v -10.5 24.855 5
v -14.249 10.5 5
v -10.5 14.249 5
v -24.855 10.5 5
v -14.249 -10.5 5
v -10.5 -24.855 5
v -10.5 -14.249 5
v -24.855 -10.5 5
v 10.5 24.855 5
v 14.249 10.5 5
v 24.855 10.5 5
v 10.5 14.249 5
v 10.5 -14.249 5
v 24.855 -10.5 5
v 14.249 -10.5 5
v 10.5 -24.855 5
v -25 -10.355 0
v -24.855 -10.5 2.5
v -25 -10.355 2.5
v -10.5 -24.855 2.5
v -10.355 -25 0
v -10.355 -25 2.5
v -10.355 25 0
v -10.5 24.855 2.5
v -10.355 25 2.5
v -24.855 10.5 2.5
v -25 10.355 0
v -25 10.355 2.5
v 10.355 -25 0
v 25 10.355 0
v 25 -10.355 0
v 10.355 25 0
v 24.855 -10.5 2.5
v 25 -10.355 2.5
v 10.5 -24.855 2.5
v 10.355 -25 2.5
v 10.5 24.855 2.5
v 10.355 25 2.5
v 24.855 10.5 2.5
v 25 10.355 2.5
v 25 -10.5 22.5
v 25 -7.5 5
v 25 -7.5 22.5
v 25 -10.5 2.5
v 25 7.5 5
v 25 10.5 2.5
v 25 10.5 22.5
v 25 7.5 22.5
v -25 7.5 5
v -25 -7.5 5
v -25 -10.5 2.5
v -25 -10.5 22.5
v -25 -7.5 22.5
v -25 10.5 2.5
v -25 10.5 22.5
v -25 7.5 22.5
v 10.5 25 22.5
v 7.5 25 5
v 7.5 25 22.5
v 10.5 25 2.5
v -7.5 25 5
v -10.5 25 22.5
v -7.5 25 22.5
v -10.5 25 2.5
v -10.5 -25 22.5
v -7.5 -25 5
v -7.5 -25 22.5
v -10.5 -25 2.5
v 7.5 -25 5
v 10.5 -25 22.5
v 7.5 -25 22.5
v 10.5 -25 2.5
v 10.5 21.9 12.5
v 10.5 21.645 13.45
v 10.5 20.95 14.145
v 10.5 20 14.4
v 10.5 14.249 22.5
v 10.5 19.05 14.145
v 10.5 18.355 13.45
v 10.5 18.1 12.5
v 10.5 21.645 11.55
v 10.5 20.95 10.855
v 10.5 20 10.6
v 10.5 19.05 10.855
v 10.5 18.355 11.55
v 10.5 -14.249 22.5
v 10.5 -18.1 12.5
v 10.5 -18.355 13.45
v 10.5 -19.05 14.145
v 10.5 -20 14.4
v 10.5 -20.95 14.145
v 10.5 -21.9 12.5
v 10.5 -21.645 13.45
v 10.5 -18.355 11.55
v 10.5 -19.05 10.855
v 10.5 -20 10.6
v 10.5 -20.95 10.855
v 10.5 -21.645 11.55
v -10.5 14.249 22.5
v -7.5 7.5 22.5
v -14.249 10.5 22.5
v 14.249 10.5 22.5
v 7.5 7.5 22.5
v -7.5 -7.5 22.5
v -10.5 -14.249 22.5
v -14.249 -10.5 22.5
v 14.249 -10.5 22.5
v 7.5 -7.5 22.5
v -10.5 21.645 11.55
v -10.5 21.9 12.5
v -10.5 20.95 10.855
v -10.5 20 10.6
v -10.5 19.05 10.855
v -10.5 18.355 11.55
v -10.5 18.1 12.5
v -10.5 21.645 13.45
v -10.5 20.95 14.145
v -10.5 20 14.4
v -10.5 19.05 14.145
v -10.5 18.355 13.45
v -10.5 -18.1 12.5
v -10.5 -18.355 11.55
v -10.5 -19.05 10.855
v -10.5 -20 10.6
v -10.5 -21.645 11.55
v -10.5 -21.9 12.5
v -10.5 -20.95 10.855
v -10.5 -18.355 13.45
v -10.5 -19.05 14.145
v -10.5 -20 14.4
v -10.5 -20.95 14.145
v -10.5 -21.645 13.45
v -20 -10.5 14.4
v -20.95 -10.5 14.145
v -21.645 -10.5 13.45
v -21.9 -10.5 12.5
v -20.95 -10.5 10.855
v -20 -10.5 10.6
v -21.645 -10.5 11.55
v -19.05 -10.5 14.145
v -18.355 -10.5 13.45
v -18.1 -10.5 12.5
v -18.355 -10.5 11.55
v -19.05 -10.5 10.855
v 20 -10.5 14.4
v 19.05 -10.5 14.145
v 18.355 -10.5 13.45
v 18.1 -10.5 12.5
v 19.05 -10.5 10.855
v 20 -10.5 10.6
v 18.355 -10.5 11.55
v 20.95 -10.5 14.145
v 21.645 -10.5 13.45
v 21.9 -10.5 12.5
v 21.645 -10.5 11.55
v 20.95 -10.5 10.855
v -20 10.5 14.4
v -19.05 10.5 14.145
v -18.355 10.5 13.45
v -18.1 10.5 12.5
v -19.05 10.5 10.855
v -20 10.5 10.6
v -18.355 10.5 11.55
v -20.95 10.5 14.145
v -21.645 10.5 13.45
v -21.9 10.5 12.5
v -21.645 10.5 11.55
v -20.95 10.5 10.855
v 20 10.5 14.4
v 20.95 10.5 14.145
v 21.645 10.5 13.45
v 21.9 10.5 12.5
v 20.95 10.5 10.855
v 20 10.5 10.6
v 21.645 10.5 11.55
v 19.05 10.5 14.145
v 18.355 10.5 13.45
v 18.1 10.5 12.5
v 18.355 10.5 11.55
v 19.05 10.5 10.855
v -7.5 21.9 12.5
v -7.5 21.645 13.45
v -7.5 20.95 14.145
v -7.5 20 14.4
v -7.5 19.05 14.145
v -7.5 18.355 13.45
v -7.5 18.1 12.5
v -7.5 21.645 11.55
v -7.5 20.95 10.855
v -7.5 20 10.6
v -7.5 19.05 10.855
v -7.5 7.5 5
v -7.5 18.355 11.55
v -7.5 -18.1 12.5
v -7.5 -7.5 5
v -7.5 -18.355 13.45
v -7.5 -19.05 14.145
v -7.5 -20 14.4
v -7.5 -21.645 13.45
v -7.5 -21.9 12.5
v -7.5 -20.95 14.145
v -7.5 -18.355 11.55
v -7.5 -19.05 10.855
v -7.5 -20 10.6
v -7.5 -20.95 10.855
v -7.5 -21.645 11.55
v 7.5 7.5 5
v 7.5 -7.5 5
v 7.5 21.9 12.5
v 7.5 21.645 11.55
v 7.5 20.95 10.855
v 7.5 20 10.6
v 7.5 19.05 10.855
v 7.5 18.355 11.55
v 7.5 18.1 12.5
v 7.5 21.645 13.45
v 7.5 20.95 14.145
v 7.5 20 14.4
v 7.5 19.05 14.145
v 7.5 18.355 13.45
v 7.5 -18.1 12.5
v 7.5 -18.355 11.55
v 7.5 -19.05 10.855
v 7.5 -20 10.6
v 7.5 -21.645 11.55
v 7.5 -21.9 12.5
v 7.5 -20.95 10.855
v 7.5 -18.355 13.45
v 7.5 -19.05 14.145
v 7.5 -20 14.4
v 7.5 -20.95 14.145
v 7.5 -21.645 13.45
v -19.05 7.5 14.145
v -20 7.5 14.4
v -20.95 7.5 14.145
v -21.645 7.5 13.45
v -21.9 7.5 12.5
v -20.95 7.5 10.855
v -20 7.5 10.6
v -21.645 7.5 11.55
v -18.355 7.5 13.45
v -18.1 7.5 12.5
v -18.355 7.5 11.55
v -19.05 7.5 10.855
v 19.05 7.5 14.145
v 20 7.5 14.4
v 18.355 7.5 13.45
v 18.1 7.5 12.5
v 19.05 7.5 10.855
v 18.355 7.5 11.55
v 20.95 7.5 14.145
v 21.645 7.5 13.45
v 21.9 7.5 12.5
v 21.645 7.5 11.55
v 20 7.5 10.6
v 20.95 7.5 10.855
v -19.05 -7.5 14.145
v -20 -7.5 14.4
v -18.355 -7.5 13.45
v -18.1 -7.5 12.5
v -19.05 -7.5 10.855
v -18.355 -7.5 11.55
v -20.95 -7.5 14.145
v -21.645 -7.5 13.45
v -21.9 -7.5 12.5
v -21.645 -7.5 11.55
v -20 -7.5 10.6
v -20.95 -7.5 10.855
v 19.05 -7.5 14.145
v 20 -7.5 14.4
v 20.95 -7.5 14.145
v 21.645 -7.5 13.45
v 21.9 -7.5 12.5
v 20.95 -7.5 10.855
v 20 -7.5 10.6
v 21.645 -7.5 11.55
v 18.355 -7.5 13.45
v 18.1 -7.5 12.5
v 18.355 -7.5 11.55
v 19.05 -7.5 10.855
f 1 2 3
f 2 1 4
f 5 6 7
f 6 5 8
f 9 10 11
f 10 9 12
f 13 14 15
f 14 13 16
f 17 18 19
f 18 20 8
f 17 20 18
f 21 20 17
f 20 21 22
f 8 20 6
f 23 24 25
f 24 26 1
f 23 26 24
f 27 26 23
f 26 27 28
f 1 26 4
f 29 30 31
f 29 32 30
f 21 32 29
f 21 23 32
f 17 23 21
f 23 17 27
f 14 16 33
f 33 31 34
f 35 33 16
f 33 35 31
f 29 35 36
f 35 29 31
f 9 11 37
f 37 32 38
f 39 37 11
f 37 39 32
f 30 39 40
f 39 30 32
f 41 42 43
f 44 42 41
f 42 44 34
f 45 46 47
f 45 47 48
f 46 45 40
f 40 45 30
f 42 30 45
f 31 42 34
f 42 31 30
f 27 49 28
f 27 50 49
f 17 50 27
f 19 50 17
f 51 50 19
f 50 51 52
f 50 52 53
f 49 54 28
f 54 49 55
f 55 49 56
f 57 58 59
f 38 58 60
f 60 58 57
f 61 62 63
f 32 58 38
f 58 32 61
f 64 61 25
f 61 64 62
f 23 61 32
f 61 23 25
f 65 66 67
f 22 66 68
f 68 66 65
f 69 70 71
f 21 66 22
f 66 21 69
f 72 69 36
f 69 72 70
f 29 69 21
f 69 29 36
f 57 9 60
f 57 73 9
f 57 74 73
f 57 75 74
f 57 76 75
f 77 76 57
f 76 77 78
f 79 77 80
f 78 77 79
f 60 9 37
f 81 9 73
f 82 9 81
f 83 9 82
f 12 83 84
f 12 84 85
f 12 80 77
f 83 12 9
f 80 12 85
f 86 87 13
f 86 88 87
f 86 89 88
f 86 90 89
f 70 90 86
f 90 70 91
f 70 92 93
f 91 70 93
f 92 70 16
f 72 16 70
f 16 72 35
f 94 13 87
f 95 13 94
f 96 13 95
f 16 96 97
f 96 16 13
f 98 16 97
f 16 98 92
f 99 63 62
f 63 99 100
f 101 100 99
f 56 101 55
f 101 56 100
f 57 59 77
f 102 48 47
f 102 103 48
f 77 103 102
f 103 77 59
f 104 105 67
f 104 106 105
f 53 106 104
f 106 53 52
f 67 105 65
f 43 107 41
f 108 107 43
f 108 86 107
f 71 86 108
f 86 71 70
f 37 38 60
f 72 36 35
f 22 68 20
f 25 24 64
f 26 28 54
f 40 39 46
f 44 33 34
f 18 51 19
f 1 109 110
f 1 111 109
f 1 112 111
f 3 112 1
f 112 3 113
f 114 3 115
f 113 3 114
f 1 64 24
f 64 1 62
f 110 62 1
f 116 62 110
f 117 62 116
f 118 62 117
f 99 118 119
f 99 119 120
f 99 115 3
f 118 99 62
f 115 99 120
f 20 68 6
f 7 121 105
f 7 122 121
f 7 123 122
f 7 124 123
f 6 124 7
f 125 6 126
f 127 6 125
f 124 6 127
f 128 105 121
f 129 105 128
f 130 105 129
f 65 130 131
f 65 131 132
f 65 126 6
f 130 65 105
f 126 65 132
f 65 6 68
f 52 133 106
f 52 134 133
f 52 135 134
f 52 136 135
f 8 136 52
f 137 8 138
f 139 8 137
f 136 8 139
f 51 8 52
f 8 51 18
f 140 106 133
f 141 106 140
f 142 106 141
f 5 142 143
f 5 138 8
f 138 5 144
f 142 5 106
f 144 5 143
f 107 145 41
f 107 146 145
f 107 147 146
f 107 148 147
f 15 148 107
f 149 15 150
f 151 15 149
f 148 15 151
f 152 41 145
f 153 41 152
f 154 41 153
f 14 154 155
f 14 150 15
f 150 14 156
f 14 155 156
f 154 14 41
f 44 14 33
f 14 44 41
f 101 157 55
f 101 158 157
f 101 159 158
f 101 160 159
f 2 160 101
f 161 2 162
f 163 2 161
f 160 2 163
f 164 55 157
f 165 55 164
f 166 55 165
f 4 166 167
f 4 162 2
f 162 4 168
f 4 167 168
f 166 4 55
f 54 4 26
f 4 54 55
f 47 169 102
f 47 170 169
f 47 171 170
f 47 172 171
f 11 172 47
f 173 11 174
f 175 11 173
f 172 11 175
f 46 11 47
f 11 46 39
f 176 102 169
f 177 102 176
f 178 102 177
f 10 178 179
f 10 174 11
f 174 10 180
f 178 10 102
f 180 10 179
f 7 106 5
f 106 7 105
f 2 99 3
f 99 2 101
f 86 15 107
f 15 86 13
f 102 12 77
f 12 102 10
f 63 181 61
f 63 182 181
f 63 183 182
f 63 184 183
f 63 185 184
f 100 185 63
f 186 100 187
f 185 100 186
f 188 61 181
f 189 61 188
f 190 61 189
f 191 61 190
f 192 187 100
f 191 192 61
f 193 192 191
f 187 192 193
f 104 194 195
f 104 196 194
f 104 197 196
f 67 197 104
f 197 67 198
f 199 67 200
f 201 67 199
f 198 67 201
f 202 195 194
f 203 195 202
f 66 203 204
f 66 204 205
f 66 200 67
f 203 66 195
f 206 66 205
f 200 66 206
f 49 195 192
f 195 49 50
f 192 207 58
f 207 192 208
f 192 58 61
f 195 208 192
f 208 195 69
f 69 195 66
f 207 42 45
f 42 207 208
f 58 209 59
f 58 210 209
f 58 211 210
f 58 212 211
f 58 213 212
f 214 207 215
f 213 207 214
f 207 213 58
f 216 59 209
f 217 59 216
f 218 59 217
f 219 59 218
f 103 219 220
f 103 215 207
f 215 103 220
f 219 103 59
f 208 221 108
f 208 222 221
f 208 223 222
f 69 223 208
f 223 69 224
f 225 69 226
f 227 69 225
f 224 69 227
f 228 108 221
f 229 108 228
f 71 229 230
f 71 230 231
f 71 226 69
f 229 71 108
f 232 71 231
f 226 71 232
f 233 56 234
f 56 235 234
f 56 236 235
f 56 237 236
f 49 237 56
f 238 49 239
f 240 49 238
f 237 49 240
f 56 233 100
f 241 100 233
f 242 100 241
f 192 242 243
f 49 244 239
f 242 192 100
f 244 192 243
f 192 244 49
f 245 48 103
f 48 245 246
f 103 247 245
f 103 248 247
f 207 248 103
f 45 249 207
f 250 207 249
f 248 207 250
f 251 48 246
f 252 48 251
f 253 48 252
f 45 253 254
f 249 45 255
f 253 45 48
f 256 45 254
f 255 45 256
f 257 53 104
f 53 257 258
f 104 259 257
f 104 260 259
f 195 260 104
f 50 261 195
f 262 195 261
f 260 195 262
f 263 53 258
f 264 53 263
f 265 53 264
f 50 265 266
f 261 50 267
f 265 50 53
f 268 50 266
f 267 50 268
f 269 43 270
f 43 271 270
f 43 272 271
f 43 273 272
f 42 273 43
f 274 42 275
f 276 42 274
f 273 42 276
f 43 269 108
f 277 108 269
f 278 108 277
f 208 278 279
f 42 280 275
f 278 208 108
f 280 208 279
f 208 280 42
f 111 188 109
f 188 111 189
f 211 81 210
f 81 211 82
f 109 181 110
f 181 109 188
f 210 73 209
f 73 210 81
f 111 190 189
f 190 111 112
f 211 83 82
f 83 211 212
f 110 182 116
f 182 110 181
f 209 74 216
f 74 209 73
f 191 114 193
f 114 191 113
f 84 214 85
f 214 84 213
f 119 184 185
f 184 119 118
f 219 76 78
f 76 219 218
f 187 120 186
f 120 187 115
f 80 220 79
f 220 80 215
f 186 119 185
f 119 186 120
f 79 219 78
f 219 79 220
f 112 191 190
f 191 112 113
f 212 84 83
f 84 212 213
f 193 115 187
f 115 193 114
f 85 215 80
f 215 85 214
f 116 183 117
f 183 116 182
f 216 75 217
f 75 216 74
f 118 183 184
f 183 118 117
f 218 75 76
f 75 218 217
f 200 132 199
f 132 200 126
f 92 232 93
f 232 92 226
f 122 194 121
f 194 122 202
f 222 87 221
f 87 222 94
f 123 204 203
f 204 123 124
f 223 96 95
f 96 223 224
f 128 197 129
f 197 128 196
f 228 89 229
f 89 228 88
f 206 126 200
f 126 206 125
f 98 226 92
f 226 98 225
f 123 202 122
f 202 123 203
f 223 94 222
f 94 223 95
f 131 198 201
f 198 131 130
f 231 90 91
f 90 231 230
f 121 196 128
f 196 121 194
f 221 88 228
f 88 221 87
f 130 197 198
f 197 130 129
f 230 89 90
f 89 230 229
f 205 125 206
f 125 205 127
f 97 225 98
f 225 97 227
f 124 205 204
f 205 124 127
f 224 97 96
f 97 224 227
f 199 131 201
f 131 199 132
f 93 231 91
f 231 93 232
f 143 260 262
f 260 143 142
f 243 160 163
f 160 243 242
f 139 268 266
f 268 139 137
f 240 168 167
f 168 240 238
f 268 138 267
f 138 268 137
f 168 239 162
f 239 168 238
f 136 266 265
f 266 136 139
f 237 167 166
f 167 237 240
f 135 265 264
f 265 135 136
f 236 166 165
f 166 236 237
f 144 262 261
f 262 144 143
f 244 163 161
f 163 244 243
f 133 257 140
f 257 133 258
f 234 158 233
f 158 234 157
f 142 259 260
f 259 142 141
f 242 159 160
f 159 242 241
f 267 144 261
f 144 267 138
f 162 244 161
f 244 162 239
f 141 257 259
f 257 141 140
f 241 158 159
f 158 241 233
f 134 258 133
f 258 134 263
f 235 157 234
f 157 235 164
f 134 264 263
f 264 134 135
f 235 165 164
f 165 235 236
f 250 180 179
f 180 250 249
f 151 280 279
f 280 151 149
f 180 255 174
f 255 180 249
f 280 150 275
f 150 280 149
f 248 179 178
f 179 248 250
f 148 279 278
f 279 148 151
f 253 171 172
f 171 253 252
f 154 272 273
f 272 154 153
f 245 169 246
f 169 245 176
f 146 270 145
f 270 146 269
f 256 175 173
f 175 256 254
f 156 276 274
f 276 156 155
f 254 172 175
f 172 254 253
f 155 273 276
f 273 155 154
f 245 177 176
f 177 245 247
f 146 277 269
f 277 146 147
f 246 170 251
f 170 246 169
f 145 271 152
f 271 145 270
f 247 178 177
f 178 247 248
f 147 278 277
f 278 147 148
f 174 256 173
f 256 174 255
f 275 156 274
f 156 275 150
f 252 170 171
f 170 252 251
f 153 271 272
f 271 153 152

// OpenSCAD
/** \file
 * 3D printed brackets for N sided LED matrix displays.
 *
 * Horizontal or vertical connections are possible.
 * The spacing between the holes differs for each.
 */
sides = 32;

// horizontal has 13 mm from edge to center of hole.
module horizontal_bracket()
{
	rotate([0,0,-360/sides/2])
	render() difference() {
		translate([-20,0,]) cube([20,6,10]);
		translate([-13,15,5]) rotate([90,0,0]) cylinder(r=3,h=20);
	}

	rotate([0,0,+360/sides/2])
	render() difference() {
		translate([0,0,]) cube([20,6,10]);
		translate([13,15,5]) rotate([90,0,0]) cylinder(r=3,h=20);
	}
}

// vertical has only 10mm
module vertical_bracket(depth)
{
	rotate([0,0,-360/sides/2])
	render() difference() {
		translate([-16,0,]) cube([16,depth,10]);
		translate([-10,1+depth,5]) rotate([90,0,0]) cylinder(r=3/2+0.4,h=depth+2, $fs=1);
	}

	rotate([0,0,+360/sides/2])
	render() difference() {
		translate([0,0,]) cube([16,depth,10]);
		translate([10,1+depth,5]) rotate([90,0,0]) cylinder(r=3/2+0.4,h=depth+2, $fs=1);
	}
}

// combo bracket has only 10mm, with 13*2 mm spacing
module vertical_bracket2()
{
	rotate([0,0,-360/sides/2])
	render() difference() {
		translate([-16,0,]) cube([16,8,26+5+5]);
		translate([-10,15,5]) rotate([90,0,0]) cylinder(r=3.5/2,h=20, $fs=1);
		translate([-10,15,26+5]) rotate([90,0,0]) cylinder(r=3.5/2,h=20, $fs=1);
	}

	rotate([0,0,+360/sides/2])
	render() difference() {
		translate([0,0,]) cube([16,8,26+5+5]);
		translate([10,15,5]) rotate([90,0,0]) cylinder(r=3.5/2,h=20, $fs=1);
		translate([10,15,26+5]) rotate([90,0,0]) cylinder(r=3.5/2,h=20, $fs=1);
	}

	translate([-7,3.5,0]) cube([14,5,26+5+5]);
}


// bracket 3 has the normal vertical bracket, with an additional
// bit to secure the 15mm extrusion.
module vertical_bracket3()
{
	vertical_bracket(12);

	render() difference() {
		union() {
			rotate([0,0,+360/sides/2]) translate([0,0,9.9]) cube([16,12,13+5+15-10]);
			rotate([0,0,-360/sides/2]) translate([-16,0,10]) cube([16,12,13+5+15-10]);
		}

		// subtract the extrusion
		translate([-15/2,-10,5+13]) cube([15,50,25]);

		// m3 screw holes to secure the extrusion to the bracket
		translate([+18,7,13+15/2+5]) rotate([0,90,180]) union() {
			cylinder(r=3/2+0.4, h=12, $fs=1);
			cylinder(r=6/2+0.4, h=4, $fs=1);
		}
		translate([-18,7,13+15/2+5]) rotate([0,90,0]) union() {
			cylinder(r=3/2+0.4, h=12, $fs=1);
			cylinder(r=6/2+0.4, h=4, $fs=1);
		}
	}
}


// the T-bracket is for securing the center struts
module t_bracket()
{
	render() difference()
	{
		translate([0,0,5/2])
		union() {
		intersection() {
			rotate([0,0,45]) cube([50,50,5], center=true);
			cube([50,50,5], center=true);
		}
		rotate([0,0,0]) translate([0,0,10]) cube([21,50,20], center=true);
		rotate([0,0,90]) translate([0,0,10]) cube([21,50,20], center=true);
		rotate([0,0,45]) translate([0,0,10]) cube([35,35,20], center=true);
		}

	translate([0,0,20/2+5]) rotate([0,0,90]) cube([100,15,20], center=true);
	translate([0,0,20/2+5]) rotate([0,0,0]) cube([100,15,20], center=true);

	// and the screw holes
	translate([-20,+20,15/2+5]) rotate([0,90,0]) cylinder(r=3/2+0.4, h=40, $fs=1);
	translate([-20,-20,15/2+5]) rotate([0,90,0]) cylinder(r=3/2+0.4, h=40, $fs=1);
	translate([-20,-20,15/2+5]) rotate([0,90,90]) cylinder(r=3/2+0.4, h=40, $fs=1);
	translate([+20,-20,15/2+5]) rotate([0,90,90]) cylinder(r=3/2+0.4, h=40, $fs=1);
	}

}


if (0)
{
for (i = [0:3])
{
	for (j = [0:3])
	{
		translate([i*15, j*37,0])
		rotate([0,0,90])
		vertical_bracket2();
	}
}
} else {
	//vertical_bracket2();
	//vertical_bracket3();
	t_bracket();
}
